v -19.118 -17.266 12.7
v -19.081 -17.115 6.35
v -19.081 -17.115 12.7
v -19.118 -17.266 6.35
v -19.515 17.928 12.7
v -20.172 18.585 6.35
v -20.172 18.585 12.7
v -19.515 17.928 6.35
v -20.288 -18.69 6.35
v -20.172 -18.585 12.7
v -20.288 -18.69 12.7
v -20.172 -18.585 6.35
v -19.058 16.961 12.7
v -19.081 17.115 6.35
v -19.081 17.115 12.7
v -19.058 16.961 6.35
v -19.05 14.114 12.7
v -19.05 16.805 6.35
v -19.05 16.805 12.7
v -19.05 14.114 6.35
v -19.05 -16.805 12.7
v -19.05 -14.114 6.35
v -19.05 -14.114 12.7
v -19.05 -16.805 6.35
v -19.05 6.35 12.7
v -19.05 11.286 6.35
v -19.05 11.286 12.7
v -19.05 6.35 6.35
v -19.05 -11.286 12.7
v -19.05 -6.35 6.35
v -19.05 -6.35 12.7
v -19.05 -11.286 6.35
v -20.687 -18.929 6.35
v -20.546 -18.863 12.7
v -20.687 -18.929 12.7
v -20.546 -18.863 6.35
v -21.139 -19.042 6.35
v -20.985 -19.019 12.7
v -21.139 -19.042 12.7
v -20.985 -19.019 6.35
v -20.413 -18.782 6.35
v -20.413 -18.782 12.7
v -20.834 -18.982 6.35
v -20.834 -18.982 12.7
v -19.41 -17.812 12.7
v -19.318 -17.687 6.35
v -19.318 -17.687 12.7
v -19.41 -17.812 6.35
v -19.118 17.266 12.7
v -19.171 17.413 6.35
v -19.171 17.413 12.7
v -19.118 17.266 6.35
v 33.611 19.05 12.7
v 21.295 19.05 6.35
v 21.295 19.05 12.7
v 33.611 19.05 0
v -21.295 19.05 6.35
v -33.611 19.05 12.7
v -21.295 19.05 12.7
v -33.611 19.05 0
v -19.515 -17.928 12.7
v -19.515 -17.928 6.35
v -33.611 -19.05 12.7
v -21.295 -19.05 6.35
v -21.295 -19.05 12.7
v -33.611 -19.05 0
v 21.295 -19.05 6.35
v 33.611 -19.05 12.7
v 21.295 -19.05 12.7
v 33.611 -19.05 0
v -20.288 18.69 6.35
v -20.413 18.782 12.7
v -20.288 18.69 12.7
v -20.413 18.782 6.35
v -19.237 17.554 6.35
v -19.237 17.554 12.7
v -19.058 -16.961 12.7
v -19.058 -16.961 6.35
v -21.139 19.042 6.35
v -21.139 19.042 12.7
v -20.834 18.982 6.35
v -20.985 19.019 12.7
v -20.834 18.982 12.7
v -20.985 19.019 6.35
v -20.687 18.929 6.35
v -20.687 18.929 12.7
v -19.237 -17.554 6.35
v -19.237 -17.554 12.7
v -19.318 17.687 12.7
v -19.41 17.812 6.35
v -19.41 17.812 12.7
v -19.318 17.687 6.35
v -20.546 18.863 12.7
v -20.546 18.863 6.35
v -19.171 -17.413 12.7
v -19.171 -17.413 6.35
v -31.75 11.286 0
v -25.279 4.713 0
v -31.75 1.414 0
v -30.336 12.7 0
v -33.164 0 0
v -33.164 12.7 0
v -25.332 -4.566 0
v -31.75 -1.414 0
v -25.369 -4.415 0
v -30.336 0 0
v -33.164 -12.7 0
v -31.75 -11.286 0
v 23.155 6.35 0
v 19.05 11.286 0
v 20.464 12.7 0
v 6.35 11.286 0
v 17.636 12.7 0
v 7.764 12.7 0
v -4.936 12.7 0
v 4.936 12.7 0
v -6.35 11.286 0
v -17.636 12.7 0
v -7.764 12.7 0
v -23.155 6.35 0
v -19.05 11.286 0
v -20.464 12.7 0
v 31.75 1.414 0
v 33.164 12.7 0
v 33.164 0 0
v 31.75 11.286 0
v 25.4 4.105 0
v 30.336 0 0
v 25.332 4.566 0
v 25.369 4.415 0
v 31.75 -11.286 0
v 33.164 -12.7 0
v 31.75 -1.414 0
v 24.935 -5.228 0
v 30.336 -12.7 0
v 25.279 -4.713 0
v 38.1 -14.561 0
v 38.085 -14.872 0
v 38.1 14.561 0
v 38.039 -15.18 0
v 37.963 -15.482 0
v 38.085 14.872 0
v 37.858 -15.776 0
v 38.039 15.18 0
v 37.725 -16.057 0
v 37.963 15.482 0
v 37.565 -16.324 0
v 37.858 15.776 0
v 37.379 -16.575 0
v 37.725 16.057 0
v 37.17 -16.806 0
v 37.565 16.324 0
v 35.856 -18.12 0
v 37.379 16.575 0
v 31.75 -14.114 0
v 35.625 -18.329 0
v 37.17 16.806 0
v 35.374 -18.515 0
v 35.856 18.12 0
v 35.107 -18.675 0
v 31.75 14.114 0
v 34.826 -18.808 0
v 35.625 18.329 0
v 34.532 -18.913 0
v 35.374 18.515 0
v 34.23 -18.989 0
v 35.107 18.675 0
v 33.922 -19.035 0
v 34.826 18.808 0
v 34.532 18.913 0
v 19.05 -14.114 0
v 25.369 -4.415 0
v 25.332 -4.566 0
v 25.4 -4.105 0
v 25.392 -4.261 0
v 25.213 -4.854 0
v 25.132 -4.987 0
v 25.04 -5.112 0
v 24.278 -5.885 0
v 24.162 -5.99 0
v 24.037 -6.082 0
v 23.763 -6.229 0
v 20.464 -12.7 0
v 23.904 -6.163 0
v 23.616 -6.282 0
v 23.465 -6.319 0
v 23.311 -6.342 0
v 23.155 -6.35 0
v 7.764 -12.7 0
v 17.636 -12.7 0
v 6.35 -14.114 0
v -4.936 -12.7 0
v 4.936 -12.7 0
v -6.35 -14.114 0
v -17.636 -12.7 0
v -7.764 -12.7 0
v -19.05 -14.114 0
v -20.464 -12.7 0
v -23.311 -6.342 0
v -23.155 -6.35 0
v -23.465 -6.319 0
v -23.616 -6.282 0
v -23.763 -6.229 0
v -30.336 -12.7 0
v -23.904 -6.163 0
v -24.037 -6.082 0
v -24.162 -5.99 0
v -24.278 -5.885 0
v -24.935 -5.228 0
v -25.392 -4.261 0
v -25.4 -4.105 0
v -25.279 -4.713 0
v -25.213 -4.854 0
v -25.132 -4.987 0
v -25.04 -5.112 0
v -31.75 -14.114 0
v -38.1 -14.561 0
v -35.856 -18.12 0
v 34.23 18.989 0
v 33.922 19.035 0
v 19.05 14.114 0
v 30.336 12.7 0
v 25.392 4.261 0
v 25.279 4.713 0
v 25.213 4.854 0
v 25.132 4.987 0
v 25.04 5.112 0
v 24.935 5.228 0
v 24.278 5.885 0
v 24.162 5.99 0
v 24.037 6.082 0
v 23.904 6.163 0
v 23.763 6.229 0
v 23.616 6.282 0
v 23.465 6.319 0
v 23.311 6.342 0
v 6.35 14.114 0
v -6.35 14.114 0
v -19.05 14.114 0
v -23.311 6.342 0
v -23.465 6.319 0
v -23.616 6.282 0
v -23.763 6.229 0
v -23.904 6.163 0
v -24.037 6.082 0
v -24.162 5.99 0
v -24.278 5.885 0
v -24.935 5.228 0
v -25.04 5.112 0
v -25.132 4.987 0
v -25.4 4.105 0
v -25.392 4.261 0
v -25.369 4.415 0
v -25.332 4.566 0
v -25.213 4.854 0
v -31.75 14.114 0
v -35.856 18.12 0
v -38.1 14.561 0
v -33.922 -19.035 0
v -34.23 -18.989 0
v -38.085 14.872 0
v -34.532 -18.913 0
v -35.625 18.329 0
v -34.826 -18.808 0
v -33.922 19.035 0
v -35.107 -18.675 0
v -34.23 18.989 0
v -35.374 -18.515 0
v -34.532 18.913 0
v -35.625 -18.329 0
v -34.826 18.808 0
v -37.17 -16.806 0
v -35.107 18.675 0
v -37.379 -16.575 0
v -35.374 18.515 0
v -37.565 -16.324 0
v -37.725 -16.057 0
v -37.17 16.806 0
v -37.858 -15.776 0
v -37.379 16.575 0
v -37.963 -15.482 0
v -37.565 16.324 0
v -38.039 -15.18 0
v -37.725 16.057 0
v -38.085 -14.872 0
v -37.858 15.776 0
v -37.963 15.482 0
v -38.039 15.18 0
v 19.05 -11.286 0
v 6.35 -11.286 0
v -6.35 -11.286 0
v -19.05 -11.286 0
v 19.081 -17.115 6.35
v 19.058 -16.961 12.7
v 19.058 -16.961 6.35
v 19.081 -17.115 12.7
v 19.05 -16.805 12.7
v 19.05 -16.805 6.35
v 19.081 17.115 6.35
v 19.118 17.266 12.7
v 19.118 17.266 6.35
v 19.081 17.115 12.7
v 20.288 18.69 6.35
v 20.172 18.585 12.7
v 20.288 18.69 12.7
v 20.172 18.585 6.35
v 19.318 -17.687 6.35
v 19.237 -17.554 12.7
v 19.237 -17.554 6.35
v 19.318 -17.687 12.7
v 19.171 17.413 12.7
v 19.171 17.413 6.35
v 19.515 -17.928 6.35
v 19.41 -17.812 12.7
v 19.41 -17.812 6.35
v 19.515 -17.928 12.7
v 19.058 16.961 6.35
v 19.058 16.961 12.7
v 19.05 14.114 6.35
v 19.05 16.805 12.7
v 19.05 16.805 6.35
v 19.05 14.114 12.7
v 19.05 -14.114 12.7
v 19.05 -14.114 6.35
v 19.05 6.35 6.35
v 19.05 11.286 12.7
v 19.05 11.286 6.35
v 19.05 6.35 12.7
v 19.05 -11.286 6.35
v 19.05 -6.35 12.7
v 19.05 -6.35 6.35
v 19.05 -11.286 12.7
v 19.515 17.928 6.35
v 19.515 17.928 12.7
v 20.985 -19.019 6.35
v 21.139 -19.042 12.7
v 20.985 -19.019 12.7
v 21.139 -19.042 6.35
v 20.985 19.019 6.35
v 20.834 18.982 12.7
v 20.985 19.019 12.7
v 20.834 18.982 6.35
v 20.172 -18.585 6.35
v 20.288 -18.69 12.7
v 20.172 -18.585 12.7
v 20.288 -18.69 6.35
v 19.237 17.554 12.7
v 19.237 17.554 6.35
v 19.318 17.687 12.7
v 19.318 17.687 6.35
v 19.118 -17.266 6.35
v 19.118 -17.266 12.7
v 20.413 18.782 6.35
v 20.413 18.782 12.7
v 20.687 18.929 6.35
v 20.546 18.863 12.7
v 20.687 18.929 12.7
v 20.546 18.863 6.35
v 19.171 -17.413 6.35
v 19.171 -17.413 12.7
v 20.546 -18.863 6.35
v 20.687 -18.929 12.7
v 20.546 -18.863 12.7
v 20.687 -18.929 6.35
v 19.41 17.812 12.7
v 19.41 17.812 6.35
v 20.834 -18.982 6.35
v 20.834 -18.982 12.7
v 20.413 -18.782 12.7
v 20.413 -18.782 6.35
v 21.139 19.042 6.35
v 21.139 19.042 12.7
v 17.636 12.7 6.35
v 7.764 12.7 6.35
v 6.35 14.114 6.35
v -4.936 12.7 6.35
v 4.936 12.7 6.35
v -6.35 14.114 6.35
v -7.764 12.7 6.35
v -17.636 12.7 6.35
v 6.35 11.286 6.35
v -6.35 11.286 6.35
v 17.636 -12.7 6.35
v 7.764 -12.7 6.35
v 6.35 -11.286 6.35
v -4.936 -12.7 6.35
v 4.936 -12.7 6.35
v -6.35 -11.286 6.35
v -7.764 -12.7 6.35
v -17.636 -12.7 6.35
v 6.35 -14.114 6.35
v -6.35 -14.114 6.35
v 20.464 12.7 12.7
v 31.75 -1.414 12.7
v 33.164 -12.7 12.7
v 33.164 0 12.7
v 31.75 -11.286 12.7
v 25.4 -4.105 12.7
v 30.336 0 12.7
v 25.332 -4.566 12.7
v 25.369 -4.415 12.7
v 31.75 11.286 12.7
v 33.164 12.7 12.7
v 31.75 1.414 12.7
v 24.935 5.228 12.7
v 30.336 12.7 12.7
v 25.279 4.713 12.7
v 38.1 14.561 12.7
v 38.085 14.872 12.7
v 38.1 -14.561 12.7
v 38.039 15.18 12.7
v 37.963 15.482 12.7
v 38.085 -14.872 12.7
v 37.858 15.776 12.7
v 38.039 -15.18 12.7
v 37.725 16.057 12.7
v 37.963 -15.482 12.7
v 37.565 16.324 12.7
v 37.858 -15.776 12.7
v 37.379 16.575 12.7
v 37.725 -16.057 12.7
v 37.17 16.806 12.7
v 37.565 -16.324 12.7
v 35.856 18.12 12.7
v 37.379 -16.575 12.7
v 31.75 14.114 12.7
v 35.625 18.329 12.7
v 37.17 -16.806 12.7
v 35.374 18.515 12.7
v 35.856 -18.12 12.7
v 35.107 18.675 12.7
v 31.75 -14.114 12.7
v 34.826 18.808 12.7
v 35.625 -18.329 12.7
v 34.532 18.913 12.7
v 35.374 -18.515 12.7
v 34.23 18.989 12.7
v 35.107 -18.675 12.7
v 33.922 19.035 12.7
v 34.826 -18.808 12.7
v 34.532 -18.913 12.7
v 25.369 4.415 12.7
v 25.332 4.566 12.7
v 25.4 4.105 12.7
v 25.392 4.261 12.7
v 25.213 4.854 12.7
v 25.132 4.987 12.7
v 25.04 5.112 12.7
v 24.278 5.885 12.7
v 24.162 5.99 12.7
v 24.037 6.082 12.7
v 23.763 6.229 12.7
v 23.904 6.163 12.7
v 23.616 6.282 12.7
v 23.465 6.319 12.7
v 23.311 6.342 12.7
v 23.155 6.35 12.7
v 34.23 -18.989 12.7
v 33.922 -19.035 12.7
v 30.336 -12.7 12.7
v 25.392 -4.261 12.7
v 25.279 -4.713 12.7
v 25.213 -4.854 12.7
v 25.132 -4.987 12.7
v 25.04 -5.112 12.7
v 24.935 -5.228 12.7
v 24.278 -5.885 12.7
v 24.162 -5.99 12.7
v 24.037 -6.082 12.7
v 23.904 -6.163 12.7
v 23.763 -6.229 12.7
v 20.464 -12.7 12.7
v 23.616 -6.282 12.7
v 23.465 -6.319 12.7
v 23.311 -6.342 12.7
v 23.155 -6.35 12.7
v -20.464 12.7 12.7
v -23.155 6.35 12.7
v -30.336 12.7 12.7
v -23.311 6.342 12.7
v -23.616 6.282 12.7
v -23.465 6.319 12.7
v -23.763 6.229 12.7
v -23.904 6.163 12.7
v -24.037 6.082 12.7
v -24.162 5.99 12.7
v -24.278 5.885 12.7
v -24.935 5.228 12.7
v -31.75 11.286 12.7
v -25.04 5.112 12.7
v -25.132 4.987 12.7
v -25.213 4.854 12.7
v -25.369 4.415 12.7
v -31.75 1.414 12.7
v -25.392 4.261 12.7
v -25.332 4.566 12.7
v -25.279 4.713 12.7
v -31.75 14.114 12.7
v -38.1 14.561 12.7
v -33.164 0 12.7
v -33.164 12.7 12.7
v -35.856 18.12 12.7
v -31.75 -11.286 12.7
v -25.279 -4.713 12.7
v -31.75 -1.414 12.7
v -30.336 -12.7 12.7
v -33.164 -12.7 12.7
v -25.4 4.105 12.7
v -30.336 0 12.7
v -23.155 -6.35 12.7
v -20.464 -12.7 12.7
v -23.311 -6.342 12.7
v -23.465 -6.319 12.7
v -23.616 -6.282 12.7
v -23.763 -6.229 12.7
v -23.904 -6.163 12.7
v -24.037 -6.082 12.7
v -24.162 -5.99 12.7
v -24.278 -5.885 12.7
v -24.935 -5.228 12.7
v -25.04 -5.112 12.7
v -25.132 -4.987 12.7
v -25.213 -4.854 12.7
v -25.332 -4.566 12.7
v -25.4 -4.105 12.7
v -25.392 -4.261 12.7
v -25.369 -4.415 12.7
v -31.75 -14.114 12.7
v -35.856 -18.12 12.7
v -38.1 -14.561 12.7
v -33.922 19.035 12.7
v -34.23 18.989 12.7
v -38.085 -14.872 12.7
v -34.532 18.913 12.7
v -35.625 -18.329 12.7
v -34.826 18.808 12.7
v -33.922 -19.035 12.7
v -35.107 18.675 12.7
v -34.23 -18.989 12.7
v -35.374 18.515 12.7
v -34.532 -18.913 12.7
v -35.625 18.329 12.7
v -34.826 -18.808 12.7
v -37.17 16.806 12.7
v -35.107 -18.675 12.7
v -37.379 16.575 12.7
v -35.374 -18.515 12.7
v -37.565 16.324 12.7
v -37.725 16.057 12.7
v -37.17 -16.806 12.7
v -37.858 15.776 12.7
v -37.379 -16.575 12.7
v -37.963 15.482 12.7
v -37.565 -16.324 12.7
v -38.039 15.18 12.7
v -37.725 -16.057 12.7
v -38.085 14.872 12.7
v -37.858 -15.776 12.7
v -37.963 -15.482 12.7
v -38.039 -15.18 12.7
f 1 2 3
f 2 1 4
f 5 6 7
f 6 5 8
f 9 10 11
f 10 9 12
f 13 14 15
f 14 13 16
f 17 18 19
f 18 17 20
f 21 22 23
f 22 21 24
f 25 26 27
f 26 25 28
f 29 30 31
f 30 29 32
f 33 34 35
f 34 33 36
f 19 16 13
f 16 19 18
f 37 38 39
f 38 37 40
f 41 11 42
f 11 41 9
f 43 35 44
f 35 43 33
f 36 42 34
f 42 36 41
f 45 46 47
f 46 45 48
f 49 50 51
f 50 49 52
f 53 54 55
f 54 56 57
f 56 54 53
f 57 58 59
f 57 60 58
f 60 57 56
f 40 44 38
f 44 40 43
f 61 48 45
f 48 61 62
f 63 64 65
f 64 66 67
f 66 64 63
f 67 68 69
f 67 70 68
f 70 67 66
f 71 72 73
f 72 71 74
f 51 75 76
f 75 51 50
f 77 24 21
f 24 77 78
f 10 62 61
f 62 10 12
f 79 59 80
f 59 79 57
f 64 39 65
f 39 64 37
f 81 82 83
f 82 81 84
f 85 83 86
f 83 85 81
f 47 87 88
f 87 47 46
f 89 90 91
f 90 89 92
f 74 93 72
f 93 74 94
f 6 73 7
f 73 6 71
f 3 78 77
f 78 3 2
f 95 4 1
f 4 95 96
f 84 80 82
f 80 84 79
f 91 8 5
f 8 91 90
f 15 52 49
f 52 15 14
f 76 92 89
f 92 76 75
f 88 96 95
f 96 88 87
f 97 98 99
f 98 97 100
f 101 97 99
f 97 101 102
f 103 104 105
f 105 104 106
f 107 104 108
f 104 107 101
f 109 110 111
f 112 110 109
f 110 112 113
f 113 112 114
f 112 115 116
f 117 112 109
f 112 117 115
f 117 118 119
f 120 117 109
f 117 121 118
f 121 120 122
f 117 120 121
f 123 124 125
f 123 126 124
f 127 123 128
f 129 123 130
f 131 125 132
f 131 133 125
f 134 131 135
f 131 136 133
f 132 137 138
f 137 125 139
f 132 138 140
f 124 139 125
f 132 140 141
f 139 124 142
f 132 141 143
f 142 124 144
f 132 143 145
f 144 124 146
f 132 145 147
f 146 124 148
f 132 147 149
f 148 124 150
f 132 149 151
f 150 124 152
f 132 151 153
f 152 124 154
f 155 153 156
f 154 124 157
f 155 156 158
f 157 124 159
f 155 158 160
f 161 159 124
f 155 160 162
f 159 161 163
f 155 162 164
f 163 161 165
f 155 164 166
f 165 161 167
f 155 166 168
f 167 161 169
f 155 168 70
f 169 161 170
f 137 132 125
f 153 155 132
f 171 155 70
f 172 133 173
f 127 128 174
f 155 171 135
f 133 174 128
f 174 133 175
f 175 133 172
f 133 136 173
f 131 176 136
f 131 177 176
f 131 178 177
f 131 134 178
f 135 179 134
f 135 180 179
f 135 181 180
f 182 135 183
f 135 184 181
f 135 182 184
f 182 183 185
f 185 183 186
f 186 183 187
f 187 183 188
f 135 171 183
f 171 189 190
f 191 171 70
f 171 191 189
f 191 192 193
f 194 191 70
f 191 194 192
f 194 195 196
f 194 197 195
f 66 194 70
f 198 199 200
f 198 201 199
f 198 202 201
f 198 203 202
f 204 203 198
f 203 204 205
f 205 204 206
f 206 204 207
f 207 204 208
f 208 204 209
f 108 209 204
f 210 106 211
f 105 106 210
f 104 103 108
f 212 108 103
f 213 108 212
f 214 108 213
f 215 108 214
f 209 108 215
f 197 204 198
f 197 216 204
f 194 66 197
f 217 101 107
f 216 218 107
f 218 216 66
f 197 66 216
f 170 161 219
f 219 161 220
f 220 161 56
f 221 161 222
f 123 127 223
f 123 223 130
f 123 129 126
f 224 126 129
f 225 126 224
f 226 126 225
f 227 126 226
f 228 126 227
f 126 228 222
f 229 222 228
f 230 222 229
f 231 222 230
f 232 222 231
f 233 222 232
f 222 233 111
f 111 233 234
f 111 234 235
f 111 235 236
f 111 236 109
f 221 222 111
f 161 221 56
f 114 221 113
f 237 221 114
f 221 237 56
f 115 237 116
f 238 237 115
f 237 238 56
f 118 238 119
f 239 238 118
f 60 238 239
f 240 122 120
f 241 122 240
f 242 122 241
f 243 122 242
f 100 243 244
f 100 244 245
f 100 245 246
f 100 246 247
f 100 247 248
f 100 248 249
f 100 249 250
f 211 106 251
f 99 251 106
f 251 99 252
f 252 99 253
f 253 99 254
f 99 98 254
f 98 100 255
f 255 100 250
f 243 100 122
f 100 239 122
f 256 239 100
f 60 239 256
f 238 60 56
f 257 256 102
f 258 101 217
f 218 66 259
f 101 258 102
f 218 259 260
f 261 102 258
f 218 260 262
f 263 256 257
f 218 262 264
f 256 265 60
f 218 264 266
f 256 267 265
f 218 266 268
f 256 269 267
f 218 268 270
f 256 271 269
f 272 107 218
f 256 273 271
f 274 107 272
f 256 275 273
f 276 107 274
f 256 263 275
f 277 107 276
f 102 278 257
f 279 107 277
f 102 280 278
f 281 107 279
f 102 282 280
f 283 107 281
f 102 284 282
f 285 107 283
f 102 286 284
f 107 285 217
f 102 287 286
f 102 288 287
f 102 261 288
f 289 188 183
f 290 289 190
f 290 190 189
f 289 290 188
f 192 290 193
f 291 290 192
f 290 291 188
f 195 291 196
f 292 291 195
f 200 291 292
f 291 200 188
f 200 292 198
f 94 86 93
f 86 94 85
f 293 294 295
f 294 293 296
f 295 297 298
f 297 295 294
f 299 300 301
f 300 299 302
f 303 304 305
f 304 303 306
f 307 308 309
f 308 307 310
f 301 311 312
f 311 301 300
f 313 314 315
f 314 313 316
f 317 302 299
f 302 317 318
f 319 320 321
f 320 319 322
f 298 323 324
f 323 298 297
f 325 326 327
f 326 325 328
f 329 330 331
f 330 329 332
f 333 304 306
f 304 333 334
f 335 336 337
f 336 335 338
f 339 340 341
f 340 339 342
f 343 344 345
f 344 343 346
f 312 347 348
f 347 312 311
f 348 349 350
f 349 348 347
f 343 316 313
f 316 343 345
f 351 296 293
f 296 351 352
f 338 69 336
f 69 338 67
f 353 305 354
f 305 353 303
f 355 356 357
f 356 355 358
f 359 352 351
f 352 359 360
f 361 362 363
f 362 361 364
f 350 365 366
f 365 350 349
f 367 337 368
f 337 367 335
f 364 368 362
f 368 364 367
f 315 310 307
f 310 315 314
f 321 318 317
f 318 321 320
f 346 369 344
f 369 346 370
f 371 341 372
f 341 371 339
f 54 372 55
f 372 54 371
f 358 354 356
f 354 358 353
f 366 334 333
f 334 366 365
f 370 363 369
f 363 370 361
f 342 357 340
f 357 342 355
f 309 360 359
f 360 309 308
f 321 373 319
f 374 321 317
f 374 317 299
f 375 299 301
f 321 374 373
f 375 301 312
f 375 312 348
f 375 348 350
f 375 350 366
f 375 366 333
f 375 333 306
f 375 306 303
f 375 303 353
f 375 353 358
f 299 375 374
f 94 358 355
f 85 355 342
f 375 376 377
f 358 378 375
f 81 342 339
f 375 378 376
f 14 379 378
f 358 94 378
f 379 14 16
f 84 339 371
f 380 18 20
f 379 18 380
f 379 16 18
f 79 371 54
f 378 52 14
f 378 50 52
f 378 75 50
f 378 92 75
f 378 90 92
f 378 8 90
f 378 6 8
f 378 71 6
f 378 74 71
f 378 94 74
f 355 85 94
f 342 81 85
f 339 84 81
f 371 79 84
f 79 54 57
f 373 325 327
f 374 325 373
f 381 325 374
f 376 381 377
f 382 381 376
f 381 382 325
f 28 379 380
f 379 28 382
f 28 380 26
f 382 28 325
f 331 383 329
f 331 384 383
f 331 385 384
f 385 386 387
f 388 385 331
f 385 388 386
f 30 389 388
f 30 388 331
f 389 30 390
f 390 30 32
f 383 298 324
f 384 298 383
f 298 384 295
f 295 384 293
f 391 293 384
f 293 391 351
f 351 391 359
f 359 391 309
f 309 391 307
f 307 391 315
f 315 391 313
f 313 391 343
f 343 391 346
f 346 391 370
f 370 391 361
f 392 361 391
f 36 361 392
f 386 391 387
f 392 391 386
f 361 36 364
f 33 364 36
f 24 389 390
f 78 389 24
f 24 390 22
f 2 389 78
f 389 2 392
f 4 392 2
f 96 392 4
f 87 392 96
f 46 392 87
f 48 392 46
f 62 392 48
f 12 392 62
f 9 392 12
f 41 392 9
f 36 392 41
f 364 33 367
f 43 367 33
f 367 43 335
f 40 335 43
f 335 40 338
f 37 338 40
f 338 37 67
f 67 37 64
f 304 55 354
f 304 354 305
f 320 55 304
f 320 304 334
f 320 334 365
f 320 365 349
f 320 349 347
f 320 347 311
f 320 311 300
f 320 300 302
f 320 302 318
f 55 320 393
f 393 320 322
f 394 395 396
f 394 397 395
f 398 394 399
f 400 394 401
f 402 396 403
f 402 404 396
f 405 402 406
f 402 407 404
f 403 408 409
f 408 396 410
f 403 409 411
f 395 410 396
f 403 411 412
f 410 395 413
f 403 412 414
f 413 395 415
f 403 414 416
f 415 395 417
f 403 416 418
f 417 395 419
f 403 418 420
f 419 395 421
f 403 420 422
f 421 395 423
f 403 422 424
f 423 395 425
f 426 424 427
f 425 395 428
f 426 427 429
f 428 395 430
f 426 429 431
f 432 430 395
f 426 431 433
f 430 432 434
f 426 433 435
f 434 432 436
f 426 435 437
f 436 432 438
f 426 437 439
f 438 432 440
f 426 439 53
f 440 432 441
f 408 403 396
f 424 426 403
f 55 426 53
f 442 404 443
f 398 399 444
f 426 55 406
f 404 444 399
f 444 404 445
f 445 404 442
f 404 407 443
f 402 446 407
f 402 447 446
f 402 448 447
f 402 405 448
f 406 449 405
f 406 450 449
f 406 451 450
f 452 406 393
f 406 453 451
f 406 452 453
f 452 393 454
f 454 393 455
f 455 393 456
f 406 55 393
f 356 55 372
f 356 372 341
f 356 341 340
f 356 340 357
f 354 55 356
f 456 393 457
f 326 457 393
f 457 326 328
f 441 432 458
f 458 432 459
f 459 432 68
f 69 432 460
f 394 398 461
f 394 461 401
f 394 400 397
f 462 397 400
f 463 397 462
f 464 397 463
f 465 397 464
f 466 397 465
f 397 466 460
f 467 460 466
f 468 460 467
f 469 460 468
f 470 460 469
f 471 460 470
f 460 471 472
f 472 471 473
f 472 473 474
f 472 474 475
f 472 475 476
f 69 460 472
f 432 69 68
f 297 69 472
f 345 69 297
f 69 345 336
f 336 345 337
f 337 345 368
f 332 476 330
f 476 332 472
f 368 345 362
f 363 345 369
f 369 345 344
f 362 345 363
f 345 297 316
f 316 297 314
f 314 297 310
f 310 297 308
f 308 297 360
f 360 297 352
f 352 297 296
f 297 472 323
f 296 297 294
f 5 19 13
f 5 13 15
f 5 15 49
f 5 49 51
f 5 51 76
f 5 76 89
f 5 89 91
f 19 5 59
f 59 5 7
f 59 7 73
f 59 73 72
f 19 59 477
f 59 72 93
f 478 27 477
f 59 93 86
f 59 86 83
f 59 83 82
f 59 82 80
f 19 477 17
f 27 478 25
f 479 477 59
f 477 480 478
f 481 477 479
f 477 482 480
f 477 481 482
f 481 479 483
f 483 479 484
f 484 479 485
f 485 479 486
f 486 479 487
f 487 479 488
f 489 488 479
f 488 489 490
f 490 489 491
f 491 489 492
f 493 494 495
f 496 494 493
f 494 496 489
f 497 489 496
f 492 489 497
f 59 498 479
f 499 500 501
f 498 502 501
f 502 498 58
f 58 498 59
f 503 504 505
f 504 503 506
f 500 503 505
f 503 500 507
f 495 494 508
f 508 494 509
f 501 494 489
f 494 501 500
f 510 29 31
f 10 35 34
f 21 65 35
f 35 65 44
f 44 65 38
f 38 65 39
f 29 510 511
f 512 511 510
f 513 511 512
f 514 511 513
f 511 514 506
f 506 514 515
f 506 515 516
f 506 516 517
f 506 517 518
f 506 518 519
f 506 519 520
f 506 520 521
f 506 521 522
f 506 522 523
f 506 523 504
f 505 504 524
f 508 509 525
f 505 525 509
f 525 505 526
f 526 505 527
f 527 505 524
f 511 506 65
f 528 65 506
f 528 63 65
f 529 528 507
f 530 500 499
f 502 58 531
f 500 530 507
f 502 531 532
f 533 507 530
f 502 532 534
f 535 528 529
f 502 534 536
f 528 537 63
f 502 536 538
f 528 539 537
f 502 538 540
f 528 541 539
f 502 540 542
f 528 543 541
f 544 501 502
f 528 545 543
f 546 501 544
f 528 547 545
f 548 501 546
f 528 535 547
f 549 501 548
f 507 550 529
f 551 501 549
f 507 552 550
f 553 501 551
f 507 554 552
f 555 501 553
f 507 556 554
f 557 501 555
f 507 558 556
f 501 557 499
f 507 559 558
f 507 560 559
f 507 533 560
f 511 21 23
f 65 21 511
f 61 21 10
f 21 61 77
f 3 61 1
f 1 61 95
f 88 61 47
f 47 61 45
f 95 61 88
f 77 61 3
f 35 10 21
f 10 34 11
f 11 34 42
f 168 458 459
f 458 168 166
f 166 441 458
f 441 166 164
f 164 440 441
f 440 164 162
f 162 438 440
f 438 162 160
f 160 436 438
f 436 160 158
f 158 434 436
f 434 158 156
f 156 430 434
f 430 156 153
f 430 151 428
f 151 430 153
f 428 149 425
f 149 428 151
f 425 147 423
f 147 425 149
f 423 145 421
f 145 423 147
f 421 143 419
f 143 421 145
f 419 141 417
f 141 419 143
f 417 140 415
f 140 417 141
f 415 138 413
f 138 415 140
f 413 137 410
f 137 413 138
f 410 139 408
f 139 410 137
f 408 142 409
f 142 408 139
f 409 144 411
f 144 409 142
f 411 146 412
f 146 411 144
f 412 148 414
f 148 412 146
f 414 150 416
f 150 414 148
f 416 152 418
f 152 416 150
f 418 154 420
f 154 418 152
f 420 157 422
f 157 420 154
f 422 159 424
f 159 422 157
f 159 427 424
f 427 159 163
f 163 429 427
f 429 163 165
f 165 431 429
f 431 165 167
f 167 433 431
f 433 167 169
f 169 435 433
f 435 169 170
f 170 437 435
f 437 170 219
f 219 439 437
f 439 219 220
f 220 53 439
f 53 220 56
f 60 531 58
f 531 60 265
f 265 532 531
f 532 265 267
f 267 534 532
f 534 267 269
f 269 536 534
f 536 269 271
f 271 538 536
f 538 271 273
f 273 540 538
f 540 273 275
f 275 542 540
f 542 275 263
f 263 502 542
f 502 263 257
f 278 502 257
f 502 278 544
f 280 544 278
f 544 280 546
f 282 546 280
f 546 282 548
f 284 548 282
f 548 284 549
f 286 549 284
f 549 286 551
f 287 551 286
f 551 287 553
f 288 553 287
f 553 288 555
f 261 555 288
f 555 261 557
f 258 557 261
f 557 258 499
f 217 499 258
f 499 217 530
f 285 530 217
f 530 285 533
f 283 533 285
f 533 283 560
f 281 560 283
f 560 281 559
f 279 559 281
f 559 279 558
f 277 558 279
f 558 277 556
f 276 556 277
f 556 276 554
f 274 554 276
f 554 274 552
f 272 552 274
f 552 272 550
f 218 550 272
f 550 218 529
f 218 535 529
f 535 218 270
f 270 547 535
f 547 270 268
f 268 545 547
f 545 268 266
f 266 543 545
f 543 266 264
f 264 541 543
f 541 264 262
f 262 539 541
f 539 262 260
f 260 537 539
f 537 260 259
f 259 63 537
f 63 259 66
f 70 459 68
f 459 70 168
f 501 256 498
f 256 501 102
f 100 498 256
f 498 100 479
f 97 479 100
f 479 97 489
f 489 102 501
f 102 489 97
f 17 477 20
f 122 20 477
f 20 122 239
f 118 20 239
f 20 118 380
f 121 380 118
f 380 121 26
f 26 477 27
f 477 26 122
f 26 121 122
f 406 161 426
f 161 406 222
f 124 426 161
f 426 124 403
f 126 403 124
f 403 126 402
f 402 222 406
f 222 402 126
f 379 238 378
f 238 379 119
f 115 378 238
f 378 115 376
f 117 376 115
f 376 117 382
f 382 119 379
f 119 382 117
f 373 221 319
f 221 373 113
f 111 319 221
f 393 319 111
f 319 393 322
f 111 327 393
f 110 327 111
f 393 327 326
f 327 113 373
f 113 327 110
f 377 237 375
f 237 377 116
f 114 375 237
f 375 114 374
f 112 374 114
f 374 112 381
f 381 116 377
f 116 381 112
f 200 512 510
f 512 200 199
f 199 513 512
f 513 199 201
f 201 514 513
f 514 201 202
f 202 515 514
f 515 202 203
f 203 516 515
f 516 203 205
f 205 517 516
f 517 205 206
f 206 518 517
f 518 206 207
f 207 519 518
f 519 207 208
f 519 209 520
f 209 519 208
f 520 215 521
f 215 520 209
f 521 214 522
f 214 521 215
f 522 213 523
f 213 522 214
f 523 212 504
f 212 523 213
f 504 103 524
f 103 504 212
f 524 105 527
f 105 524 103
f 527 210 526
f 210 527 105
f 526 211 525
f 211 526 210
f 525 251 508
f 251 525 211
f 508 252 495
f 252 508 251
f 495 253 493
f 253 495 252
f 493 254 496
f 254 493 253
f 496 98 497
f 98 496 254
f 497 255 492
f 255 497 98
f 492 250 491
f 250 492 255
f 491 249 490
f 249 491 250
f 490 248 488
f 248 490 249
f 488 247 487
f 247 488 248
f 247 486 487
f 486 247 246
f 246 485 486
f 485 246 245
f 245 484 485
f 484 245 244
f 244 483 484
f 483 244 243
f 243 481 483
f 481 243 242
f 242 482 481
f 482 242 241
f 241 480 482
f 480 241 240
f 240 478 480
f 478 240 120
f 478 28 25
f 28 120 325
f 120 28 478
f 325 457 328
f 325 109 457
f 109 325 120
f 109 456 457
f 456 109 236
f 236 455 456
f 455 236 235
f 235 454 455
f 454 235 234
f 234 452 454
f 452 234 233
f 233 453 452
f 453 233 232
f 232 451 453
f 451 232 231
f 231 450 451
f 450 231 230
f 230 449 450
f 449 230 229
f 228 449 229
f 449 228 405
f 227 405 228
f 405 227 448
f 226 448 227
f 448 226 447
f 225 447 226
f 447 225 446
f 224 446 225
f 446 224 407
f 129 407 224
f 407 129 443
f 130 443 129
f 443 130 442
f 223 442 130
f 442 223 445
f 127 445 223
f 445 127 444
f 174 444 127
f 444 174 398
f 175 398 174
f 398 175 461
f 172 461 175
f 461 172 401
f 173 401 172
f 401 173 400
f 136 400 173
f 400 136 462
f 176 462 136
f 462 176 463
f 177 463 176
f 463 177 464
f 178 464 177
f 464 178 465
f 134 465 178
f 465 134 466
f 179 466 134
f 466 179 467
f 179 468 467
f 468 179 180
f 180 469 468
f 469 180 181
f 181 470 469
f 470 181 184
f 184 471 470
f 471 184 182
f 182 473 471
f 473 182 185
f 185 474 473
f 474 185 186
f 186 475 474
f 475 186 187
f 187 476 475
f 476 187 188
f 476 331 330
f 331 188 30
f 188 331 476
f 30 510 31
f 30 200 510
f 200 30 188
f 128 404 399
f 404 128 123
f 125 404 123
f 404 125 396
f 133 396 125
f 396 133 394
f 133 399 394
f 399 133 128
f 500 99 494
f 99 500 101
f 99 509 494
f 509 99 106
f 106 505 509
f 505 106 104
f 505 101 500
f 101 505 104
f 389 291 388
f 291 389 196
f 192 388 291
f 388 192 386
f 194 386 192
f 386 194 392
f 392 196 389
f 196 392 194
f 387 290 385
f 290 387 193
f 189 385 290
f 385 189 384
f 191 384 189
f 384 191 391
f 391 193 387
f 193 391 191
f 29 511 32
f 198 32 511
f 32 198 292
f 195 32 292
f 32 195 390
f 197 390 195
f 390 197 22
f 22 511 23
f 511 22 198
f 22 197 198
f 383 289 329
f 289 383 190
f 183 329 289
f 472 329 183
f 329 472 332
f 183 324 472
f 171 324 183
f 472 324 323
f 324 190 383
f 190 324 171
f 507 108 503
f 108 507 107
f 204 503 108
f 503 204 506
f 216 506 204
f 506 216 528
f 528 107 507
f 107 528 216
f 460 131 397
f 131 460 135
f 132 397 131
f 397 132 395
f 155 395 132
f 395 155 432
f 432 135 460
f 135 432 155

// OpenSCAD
// file: ../lib/TOGShapeLib-v1.scad
// Private functions/modules

function tog_shapelib__zip(a0, a1, func) = assert(len(a0) == len(a1)) [
	for( i=[0:1:len(a0)-1] ) func(a0[i], a1[i])
];


// Intentionally exported:

module tog_shapelib_rounded_square(size, corner_radius, offset=0) {
	assert(corner_radius + offset > 0);
	assert(corner_radius < size[0]/2);
	assert(corner_radius < size[1]/2);
	// TODO: Special cases when those assertions would fail
	hull() for( ym=[-1,1] ) for( xm=[-1,1] ) {
		translate([
			xm*(size[0]/2-corner_radius),
			ym*(size[1]/2-corner_radius),
		]) circle(r=corner_radius+offset);
	}	
}

module tog_shapelib_rounded_beveled_square(size, bevel_size=3.175, rounding_radius=undef, offset=0) {
	rounding_radius = is_undef(rounding_radius) ? bevel_size : rounding_radius;
	// Could special-case these, but in the meantime:
	assert(bevel_size > 0);
	// Make sure things don't go negative:
	assert(size[0]/2 - bevel_size - rounding_radius*0.414 >= 0);
	assert(size[1]/2 - bevel_size - rounding_radius*0.414 >= 0);
	// Maybe not exactly necessary
	assert(rounding_radius <= bevel_size);
	
	hull() for( ym=[-1,1] ) for( xm=[-1,1] ) {
		translate([
			xm*(size[0]/2 - rounding_radius),
			ym*(size[1]/2 - bevel_size - rounding_radius*0.414),
		]) circle(r=rounding_radius+offset);
		translate([
			xm*(size[0]/2 - bevel_size - rounding_radius*0.414),
			ym*(size[1]/2 - rounding_radius),
		]) circle(r=rounding_radius+offset);
	}
}

module tog_shapelib_rounded_cube(size, corner_radius=0, offset=0) {
	if( corner_radius <= 0 ) {
		cube([size[0]-offset*2, size[1]-offset*2, size[2]-offset*2], center=true);
	} else {
		// TODO: Special case for corner_radius=0
		hull() for( zm=[-1,1] ) for( ym=[-1,1] ) for( xm=[-1,1] ) {
			translate([
				xm*(size[0]/2-corner_radius),
				ym*(size[1]/2-corner_radius),
				zm*(size[2]/2-corner_radius),
			]) sphere(r=corner_radius+offset);
		}
	}
}

module tog_shapelib_xy_rounded_cube(size, corner_radius, offset=0) {
	linear_extrude(size[2]+offset*2, center=true) tog_shapelib_rounded_square(size, corner_radius, offset=offset);
}
module tog_shapelib_xz_rounded_cube(size, corner_radius, offset=0) {
	rotate([90,0,0]) tog_shapelib_xy_rounded_cube([size[0], size[2], size[1]], corner_radius, offset=offset);
}
module tog_shapelib_yz_rounded_cube(size, corner_radius, offset=0) {
	rotate([0,90,0]) tog_shapelib_xy_rounded_cube([size[2], size[1], size[0]], corner_radius, offset=offset);
}

module tog_shapelib_facerounded_beveled_cube(size, corner_radius, face_corner_radius, offset=0) {
	outer_scale = [for(d=size) (d+offset*2)/d];
	inner_scale = [for(d=size) (d-corner_radius*2)/d]; // Purposely not taking offset into account for inner square
	outer_size = tog_shapelib__zip(size, outer_scale, function(si,sc) si*sc);
	inner_size = tog_shapelib__zip(size, inner_scale, function(si,sc) si*sc);
	hull() {
		tog_shapelib_xy_rounded_cube([inner_size[0], inner_size[1], outer_size[2]], face_corner_radius+offset);
		tog_shapelib_xz_rounded_cube([inner_size[0], outer_size[1], inner_size[2]], face_corner_radius+offset);
		tog_shapelib_yz_rounded_cube([outer_size[0], inner_size[1], inner_size[2]], face_corner_radius+offset);
	}
}
// main file
// Calibr80r-v1.1
// 
// Versions:
// v1.0:
// - Created in the hope that this will help me figure out the exact x/y scale and offset to use
//   for things like LEGO-compatible bricks and TOGridPile thingamabobs.
// v1.1:
// - Add diamond-shaped holes on 1/2" grid, to more easily check scale without regard to offset

use <../lib/TOGShapeLib-v1.scad>

inch = 25.4;

$fn = $preview ? 16 : 64;

intersection() {
	linear_extrude(1/2*inch) {
		difference() {
			tog_shapelib_rounded_beveled_square([3*inch, 1.5*inch]);
			
			tog_shapelib_rounded_beveled_square([2*inch, 0.5*inch], 1/16*inch);

			for( xm=[-2.5 : 1 : 2.5] ) for( ym=[-1 : 1 : 1] ) {
					translate([xm,ym]*1/2*inch) rotate([0,0,45]) square([2,2], center=true);
			}
		}
	}

	union() {
		linear_extrude(1/4*inch) {
			square([3*inch, 1.5*inch], center=true);
		}
		for( x=[-1.5*inch, 1.5*inch] ) {
			translate([x, 0, 0]) linear_extrude([0, 0, 1/2*inch]) {
				tog_shapelib_rounded_beveled_square([1.5*inch, 1.5*inch], 1/16*inch);
			}
		}
	}
}
